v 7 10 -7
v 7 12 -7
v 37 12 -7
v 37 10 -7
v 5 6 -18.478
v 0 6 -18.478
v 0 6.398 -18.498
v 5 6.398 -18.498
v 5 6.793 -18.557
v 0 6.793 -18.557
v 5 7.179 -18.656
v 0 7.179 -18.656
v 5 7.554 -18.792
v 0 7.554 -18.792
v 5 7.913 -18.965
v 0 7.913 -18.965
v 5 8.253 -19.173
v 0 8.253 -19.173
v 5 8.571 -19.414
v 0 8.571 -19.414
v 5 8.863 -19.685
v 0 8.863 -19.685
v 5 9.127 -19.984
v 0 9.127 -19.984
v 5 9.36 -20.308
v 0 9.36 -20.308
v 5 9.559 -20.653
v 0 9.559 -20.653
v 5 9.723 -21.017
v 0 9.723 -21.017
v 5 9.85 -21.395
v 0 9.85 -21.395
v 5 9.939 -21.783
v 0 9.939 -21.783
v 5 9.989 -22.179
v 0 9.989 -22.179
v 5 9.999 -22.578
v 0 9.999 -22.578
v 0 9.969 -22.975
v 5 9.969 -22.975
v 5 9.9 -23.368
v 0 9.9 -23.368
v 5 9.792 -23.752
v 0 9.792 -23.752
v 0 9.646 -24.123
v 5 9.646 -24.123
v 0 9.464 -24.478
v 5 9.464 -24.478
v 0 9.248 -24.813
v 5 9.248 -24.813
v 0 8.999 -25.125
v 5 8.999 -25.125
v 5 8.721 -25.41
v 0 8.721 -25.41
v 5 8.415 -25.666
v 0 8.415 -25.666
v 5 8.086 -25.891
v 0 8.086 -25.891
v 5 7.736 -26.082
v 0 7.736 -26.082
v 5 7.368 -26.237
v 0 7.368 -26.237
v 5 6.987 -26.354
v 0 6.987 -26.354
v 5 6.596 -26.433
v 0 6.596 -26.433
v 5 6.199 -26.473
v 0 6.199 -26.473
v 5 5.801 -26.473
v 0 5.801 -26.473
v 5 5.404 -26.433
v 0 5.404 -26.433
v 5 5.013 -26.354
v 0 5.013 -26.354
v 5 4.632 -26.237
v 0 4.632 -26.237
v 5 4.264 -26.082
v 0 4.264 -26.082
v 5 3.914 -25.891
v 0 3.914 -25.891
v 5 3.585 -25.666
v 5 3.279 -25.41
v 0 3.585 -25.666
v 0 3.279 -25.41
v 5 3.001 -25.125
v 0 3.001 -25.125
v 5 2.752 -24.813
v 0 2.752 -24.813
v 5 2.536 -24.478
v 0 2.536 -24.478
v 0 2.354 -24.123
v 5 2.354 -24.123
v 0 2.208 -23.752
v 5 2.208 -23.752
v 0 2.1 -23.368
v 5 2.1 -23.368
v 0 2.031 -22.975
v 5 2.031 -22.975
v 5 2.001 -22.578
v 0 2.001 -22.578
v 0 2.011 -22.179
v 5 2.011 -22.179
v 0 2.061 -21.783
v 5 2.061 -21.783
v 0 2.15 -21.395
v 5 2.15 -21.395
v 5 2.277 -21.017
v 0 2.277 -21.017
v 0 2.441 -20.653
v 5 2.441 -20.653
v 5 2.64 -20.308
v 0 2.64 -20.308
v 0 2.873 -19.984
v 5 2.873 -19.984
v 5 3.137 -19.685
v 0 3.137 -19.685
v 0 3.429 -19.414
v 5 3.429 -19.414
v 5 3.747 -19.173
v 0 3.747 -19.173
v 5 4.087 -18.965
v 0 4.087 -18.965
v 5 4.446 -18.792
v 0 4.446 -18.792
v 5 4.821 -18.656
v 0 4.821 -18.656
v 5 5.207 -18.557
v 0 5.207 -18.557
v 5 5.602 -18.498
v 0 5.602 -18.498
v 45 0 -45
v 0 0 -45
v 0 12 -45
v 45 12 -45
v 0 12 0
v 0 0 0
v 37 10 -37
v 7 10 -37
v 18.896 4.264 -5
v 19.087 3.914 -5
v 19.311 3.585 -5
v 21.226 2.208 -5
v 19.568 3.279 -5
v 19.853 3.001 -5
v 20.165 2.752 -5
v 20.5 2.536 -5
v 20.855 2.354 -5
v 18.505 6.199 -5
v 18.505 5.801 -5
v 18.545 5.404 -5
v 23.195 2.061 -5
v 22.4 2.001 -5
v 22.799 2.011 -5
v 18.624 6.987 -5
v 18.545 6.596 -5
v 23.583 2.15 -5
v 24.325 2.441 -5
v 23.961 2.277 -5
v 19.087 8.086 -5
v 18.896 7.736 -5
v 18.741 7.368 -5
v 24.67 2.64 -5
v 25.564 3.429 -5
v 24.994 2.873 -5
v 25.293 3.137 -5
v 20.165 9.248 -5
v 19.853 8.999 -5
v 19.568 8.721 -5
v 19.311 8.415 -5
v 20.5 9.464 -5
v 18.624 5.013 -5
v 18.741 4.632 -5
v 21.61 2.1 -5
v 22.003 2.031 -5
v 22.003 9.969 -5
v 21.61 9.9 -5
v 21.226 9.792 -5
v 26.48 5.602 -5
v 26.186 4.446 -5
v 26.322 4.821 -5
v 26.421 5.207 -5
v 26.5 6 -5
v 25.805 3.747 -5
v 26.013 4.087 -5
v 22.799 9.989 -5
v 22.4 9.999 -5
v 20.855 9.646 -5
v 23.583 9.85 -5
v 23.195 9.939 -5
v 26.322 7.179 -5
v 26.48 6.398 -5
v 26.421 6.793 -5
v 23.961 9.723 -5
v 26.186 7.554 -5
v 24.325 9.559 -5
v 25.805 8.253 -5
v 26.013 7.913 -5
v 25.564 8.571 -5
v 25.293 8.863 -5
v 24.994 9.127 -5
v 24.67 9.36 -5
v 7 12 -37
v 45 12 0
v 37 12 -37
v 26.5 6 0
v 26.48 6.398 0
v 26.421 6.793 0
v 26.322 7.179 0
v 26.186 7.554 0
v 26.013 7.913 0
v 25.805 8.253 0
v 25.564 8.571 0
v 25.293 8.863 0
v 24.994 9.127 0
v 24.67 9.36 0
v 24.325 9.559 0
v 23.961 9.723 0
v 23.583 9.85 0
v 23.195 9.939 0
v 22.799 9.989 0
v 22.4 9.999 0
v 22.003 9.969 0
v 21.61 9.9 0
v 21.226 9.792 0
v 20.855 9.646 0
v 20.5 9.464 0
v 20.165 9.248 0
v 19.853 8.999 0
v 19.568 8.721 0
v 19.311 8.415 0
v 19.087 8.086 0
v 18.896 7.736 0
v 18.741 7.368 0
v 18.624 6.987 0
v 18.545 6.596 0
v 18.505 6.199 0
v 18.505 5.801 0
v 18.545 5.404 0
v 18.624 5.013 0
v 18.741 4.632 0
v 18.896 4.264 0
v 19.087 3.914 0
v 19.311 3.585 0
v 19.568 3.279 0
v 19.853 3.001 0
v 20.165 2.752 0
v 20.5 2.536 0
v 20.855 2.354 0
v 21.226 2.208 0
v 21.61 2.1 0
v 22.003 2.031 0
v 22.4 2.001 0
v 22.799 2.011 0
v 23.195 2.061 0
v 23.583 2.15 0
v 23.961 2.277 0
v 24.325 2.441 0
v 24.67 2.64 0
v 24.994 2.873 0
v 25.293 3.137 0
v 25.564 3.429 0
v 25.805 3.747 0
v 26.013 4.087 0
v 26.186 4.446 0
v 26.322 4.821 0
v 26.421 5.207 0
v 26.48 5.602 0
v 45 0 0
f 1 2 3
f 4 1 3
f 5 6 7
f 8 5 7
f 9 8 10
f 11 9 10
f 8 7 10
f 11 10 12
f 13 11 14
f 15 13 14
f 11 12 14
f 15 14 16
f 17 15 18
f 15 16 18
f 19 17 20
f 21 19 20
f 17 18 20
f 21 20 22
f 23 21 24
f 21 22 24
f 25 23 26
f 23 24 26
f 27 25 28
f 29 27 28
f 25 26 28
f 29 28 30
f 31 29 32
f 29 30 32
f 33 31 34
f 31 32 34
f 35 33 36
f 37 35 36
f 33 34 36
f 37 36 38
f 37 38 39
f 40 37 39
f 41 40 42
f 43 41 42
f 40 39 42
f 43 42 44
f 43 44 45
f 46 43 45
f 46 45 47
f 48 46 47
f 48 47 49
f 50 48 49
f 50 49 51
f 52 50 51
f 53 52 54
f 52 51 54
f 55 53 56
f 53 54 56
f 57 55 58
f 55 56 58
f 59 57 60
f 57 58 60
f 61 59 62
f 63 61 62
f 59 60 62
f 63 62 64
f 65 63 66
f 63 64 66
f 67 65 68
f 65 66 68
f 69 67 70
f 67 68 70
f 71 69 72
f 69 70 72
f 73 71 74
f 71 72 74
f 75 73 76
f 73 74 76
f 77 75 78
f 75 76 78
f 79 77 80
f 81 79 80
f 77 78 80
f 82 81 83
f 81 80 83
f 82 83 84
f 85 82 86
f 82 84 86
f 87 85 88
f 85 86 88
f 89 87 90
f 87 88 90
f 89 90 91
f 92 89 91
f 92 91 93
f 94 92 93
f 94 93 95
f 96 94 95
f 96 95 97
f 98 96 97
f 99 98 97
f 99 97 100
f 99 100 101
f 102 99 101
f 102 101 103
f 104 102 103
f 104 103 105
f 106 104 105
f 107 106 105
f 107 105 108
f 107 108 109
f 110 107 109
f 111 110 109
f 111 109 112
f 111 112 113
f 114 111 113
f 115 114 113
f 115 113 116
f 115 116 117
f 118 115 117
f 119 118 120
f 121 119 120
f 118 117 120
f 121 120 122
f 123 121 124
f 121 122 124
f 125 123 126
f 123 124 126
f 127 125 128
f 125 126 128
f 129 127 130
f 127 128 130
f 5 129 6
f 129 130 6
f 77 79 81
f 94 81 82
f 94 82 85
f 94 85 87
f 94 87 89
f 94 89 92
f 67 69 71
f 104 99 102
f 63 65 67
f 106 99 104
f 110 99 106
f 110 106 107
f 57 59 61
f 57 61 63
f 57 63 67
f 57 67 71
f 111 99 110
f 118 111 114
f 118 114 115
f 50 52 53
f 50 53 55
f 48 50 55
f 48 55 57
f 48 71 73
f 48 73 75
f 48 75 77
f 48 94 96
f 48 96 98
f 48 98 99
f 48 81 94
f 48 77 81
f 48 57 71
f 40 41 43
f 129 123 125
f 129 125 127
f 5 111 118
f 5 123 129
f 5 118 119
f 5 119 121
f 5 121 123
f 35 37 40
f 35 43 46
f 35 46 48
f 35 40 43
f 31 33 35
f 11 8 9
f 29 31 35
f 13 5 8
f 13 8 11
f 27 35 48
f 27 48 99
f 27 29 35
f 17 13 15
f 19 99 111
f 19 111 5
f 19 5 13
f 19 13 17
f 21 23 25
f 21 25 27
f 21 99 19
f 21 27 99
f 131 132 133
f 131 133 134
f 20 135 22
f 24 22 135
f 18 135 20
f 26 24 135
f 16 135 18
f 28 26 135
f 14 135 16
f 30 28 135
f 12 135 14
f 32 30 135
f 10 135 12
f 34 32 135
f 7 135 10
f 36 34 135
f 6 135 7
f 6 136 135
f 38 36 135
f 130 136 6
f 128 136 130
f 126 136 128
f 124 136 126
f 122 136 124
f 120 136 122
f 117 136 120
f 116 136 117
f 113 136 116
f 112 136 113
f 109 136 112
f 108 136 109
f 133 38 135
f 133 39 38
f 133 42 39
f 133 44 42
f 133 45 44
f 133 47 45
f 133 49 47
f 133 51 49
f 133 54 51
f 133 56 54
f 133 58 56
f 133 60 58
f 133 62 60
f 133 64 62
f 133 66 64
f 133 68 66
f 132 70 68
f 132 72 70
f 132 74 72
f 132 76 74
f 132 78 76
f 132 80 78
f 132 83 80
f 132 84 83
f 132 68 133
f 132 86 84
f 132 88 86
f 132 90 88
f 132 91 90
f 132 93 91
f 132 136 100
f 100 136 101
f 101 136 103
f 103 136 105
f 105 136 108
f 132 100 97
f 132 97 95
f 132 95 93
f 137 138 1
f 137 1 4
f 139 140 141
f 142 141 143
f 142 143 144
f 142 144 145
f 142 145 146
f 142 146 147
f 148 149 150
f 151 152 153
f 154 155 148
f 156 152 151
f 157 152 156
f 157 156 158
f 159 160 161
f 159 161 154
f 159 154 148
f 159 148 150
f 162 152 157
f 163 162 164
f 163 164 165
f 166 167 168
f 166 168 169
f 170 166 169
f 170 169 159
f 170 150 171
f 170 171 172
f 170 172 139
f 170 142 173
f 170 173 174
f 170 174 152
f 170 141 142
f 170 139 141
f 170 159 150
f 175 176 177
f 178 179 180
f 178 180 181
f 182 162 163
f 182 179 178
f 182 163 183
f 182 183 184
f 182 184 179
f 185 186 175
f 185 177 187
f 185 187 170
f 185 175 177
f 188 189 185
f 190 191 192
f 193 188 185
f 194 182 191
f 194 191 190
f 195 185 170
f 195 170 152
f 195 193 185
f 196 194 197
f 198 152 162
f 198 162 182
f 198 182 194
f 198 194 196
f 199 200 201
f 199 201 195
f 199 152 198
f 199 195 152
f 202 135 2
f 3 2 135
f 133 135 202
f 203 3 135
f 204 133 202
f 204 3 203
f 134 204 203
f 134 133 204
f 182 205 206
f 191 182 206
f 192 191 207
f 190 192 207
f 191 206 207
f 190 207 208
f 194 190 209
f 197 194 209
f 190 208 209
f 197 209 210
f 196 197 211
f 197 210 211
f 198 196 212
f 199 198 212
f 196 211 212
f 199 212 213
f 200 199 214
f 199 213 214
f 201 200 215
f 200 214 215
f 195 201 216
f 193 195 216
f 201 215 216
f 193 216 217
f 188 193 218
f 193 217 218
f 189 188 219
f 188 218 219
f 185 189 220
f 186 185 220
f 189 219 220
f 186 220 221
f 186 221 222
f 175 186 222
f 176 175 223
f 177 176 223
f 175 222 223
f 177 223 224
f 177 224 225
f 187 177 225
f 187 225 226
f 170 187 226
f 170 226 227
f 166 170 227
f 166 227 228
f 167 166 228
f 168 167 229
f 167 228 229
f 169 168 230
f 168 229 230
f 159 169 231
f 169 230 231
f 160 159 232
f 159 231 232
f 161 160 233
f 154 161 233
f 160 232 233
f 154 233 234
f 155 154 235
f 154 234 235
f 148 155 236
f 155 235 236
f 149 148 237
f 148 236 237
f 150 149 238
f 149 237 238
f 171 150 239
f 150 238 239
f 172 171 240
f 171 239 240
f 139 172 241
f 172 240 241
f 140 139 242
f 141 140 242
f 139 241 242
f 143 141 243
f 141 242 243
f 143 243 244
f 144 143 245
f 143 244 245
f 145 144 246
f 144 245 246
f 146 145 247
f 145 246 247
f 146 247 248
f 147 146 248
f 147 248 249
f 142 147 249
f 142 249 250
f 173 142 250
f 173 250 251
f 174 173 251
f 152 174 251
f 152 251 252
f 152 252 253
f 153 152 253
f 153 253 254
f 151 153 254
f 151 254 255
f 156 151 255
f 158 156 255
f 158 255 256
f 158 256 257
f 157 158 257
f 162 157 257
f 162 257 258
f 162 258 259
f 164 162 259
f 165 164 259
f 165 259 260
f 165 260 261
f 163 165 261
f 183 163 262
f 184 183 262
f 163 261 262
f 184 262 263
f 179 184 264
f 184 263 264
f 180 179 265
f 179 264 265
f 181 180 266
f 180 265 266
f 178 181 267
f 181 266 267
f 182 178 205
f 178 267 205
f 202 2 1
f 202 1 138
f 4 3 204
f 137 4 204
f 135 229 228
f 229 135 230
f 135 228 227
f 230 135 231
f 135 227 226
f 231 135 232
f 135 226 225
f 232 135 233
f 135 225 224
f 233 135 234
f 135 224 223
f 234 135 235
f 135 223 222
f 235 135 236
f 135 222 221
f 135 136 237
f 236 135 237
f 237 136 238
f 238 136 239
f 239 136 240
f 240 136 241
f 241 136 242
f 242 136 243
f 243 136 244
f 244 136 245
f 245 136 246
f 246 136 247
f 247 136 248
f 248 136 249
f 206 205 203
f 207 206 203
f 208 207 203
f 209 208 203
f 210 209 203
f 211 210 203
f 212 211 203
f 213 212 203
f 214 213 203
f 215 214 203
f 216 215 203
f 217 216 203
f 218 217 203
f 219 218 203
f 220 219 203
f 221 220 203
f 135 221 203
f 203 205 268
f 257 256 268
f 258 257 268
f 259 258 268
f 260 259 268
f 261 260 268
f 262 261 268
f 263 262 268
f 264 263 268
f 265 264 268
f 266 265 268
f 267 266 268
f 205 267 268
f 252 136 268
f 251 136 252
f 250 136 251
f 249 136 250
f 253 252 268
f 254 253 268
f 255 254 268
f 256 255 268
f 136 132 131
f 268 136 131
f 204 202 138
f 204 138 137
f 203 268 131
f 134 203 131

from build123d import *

# Parameters (mm, degrees)
SKETCH_1_W          = 45
SKETCH_1_H          = 45
EXTRUDE_1_DEPTH     = 12
SKETCH_2_R          = 4
CUT_EXTRUDE_1_DEPTH = 5
SKETCH_3_R          = 4
CUT_EXTRUDE_2_DEPTH = 5
SKETCH_4_W          = 30
SKETCH_4_H          = 30
CUT_EXTRUDE_3_DEPTH = 2


with BuildPart() as part:
    # 草图1 → 凸台-拉伸1 (new body)
    with BuildSketch(Plane(origin=(0, 0, 0), x_dir=(1, 0, 0), z_dir=(0, 1, 0))):
        with Locations((22.5, 22.5)):
            Rectangle(SKETCH_1_W, SKETCH_1_H)
    extrude(amount=EXTRUDE_1_DEPTH)

    # 草图2 → 切除-拉伸1 (cut)
    with BuildSketch(Plane.XY):
        with Locations((22.5, 6)):
            Circle(SKETCH_2_R)
    extrude(amount=-CUT_EXTRUDE_1_DEPTH, mode=Mode.SUBTRACT)

    # 草图3 → 切除-拉伸2 (cut)
    with BuildSketch(Plane.ZY):
        with Locations((-22.477885381, 6)):
            Circle(SKETCH_3_R)
    extrude(amount=-CUT_EXTRUDE_2_DEPTH, mode=Mode.SUBTRACT)

    # 草图4 → 切除-拉伸3 (cut)
    with BuildSketch(Plane(origin=(0, 12, 0), x_dir=(1, 0, 0), z_dir=(0, 1, 0))):
        with Locations((22, 22)):
            Rectangle(SKETCH_4_W, SKETCH_4_H)
    extrude(amount=-CUT_EXTRUDE_3_DEPTH, mode=Mode.SUBTRACT)


solid = part.part
